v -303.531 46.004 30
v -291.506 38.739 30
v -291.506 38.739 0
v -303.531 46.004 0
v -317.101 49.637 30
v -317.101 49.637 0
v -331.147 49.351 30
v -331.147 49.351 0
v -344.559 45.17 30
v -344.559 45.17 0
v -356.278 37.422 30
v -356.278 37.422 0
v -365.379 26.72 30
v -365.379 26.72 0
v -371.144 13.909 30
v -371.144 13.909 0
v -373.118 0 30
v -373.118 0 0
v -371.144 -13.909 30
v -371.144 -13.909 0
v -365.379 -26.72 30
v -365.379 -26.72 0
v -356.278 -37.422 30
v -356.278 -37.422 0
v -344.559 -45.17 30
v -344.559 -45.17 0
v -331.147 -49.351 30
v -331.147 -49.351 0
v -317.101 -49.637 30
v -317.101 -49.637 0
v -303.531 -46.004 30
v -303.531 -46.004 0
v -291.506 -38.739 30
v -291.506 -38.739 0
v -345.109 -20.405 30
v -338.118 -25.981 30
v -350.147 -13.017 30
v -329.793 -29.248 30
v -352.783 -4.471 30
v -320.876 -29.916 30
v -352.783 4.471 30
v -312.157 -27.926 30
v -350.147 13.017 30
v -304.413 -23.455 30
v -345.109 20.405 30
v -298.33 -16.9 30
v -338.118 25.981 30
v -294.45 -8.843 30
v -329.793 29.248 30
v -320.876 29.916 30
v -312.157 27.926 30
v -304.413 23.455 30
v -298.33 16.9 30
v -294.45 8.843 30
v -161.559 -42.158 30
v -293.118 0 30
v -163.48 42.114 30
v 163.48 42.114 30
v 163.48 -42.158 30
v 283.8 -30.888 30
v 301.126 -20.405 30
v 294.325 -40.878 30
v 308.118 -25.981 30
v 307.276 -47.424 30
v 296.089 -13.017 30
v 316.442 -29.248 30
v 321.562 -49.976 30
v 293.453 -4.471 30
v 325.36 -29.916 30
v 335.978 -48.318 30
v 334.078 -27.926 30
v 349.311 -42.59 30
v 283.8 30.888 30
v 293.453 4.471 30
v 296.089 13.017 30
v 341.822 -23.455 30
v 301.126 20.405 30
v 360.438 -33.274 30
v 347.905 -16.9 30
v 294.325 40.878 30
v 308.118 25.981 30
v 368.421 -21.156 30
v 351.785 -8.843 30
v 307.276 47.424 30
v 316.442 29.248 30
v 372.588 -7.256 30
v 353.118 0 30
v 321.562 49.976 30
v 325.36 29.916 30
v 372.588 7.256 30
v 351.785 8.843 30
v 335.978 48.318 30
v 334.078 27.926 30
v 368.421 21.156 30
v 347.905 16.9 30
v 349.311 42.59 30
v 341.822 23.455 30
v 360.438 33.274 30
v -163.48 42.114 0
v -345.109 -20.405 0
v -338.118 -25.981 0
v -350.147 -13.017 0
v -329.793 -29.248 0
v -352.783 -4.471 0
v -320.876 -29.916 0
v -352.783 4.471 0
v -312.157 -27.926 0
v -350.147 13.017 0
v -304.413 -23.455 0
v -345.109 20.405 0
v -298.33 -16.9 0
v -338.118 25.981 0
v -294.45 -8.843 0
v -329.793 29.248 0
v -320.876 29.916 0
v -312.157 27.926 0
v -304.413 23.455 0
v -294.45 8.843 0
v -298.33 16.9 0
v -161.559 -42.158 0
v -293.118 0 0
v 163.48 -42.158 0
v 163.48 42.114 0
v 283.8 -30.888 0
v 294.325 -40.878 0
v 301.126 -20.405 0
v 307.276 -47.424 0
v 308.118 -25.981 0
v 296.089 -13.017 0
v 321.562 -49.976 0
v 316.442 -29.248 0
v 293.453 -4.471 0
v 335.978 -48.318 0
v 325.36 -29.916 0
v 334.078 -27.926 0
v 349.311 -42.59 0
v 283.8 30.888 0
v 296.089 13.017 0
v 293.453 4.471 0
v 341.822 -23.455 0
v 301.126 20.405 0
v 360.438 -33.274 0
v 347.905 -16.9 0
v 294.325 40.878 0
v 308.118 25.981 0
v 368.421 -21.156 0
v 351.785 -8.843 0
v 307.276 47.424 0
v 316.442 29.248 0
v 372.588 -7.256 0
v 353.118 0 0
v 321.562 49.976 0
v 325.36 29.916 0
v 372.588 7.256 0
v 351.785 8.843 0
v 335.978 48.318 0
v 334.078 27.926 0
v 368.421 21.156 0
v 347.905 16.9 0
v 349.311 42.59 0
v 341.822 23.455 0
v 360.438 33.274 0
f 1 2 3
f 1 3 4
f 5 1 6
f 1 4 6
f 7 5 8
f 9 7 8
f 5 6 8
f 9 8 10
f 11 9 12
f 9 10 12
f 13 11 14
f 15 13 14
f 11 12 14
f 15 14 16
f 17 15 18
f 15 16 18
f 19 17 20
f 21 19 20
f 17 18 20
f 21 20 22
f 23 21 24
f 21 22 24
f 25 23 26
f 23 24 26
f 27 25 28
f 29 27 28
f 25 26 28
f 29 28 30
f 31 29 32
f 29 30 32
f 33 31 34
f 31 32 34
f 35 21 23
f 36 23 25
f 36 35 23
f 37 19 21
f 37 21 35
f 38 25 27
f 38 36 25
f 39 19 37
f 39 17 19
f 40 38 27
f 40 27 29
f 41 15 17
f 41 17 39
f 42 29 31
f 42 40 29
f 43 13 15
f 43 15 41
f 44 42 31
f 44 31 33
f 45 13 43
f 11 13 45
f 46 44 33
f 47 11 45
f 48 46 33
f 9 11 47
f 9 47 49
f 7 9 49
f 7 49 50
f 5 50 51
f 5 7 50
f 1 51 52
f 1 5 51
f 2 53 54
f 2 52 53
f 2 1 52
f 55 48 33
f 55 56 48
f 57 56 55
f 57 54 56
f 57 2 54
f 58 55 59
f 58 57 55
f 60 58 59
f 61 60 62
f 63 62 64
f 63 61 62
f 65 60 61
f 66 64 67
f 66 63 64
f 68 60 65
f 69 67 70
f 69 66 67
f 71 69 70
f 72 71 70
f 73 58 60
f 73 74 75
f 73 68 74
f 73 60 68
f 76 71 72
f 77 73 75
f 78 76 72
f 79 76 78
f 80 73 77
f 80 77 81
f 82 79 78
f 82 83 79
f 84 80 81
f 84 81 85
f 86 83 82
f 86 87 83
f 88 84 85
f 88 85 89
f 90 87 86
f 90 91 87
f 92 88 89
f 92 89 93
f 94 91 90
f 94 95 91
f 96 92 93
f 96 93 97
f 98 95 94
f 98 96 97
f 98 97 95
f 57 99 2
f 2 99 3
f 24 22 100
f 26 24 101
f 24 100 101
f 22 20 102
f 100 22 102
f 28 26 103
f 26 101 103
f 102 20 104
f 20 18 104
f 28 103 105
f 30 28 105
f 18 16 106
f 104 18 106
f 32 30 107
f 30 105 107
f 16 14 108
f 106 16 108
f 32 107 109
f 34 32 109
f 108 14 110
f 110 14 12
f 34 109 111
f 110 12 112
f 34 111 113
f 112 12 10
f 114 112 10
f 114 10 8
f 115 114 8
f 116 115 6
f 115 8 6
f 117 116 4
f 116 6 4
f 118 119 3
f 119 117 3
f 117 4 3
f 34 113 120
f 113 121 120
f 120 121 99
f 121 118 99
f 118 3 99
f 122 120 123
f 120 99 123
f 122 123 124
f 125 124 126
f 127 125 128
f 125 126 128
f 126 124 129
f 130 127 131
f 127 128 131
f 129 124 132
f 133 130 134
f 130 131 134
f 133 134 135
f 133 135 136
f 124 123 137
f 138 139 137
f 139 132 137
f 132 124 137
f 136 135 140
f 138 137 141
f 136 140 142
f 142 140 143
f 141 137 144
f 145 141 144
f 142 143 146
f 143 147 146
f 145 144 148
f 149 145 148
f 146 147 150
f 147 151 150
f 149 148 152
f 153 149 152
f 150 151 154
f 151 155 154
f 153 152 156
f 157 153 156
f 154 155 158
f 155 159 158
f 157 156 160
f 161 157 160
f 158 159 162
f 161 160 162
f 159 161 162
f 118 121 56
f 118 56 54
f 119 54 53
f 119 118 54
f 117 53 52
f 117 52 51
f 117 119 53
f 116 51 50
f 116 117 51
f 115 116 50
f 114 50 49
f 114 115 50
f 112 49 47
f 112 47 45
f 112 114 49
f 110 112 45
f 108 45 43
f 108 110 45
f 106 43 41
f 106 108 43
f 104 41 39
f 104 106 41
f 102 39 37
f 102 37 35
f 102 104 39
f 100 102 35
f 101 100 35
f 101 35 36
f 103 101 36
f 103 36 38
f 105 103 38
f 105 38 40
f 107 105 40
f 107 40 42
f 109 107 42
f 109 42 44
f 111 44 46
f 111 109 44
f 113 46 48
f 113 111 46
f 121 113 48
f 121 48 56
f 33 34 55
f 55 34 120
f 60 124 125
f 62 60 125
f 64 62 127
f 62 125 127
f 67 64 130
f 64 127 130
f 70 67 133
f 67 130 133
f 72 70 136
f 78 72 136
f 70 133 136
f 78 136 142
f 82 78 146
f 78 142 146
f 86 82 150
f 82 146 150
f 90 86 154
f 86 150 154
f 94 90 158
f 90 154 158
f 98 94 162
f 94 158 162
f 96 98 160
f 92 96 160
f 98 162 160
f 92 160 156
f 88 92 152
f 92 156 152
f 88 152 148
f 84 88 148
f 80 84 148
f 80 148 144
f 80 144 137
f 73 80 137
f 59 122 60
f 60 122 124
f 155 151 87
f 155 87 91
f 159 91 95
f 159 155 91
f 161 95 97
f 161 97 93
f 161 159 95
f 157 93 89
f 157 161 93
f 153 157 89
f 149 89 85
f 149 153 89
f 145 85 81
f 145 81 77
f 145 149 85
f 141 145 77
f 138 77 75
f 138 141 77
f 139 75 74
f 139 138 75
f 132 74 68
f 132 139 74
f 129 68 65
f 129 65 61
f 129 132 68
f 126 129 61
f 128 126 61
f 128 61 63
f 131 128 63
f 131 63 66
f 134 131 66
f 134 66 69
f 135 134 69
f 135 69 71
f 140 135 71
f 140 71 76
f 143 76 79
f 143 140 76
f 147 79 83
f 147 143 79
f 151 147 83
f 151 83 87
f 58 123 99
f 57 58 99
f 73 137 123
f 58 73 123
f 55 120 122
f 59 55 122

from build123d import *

# Parameters (mm, degrees)
SKETCH1_R           = 30
BOSS_EXTRUDE1_DEPTH = 30


with BuildPart() as part:
    # Sketch1 → Boss-Extrude1 (new body)
    with BuildSketch(Plane.XY):
        with BuildLine():
            Line((-163.480061578, 42.114452454), (-291.506249588, 38.739141102))
            ThreePointArc((-291.506249588, 38.739141102), (-373.11762328, 0), (-291.506249588, -38.739141102))
            Line((-291.506249588, -38.739141102), (-161.55881164, -42.158253128))
            Line((-161.55881164, -42.158253128), (163.480061578, -42.158253128))
            Line((163.480061578, -42.158253128), (283.79954089, -30.888321372))
            ThreePointArc((283.79954089, -30.888321372), (373.11762328, 0), (283.79954089, 30.888321372))
            Line((283.79954089, 30.888321372), (163.480061578, 42.114452454))
            Line((163.480061578, 42.114452454), (-163.480061578, 42.114452454))
        make_face()
        with Locations((-323.11762328, 0)):
            Circle(SKETCH1_R, mode=Mode.SUBTRACT)
        with Locations((323.11762328, 0)):
            Circle(SKETCH1_R, mode=Mode.SUBTRACT)
    extrude(amount=BOSS_EXTRUDE1_DEPTH)


solid = part.part
